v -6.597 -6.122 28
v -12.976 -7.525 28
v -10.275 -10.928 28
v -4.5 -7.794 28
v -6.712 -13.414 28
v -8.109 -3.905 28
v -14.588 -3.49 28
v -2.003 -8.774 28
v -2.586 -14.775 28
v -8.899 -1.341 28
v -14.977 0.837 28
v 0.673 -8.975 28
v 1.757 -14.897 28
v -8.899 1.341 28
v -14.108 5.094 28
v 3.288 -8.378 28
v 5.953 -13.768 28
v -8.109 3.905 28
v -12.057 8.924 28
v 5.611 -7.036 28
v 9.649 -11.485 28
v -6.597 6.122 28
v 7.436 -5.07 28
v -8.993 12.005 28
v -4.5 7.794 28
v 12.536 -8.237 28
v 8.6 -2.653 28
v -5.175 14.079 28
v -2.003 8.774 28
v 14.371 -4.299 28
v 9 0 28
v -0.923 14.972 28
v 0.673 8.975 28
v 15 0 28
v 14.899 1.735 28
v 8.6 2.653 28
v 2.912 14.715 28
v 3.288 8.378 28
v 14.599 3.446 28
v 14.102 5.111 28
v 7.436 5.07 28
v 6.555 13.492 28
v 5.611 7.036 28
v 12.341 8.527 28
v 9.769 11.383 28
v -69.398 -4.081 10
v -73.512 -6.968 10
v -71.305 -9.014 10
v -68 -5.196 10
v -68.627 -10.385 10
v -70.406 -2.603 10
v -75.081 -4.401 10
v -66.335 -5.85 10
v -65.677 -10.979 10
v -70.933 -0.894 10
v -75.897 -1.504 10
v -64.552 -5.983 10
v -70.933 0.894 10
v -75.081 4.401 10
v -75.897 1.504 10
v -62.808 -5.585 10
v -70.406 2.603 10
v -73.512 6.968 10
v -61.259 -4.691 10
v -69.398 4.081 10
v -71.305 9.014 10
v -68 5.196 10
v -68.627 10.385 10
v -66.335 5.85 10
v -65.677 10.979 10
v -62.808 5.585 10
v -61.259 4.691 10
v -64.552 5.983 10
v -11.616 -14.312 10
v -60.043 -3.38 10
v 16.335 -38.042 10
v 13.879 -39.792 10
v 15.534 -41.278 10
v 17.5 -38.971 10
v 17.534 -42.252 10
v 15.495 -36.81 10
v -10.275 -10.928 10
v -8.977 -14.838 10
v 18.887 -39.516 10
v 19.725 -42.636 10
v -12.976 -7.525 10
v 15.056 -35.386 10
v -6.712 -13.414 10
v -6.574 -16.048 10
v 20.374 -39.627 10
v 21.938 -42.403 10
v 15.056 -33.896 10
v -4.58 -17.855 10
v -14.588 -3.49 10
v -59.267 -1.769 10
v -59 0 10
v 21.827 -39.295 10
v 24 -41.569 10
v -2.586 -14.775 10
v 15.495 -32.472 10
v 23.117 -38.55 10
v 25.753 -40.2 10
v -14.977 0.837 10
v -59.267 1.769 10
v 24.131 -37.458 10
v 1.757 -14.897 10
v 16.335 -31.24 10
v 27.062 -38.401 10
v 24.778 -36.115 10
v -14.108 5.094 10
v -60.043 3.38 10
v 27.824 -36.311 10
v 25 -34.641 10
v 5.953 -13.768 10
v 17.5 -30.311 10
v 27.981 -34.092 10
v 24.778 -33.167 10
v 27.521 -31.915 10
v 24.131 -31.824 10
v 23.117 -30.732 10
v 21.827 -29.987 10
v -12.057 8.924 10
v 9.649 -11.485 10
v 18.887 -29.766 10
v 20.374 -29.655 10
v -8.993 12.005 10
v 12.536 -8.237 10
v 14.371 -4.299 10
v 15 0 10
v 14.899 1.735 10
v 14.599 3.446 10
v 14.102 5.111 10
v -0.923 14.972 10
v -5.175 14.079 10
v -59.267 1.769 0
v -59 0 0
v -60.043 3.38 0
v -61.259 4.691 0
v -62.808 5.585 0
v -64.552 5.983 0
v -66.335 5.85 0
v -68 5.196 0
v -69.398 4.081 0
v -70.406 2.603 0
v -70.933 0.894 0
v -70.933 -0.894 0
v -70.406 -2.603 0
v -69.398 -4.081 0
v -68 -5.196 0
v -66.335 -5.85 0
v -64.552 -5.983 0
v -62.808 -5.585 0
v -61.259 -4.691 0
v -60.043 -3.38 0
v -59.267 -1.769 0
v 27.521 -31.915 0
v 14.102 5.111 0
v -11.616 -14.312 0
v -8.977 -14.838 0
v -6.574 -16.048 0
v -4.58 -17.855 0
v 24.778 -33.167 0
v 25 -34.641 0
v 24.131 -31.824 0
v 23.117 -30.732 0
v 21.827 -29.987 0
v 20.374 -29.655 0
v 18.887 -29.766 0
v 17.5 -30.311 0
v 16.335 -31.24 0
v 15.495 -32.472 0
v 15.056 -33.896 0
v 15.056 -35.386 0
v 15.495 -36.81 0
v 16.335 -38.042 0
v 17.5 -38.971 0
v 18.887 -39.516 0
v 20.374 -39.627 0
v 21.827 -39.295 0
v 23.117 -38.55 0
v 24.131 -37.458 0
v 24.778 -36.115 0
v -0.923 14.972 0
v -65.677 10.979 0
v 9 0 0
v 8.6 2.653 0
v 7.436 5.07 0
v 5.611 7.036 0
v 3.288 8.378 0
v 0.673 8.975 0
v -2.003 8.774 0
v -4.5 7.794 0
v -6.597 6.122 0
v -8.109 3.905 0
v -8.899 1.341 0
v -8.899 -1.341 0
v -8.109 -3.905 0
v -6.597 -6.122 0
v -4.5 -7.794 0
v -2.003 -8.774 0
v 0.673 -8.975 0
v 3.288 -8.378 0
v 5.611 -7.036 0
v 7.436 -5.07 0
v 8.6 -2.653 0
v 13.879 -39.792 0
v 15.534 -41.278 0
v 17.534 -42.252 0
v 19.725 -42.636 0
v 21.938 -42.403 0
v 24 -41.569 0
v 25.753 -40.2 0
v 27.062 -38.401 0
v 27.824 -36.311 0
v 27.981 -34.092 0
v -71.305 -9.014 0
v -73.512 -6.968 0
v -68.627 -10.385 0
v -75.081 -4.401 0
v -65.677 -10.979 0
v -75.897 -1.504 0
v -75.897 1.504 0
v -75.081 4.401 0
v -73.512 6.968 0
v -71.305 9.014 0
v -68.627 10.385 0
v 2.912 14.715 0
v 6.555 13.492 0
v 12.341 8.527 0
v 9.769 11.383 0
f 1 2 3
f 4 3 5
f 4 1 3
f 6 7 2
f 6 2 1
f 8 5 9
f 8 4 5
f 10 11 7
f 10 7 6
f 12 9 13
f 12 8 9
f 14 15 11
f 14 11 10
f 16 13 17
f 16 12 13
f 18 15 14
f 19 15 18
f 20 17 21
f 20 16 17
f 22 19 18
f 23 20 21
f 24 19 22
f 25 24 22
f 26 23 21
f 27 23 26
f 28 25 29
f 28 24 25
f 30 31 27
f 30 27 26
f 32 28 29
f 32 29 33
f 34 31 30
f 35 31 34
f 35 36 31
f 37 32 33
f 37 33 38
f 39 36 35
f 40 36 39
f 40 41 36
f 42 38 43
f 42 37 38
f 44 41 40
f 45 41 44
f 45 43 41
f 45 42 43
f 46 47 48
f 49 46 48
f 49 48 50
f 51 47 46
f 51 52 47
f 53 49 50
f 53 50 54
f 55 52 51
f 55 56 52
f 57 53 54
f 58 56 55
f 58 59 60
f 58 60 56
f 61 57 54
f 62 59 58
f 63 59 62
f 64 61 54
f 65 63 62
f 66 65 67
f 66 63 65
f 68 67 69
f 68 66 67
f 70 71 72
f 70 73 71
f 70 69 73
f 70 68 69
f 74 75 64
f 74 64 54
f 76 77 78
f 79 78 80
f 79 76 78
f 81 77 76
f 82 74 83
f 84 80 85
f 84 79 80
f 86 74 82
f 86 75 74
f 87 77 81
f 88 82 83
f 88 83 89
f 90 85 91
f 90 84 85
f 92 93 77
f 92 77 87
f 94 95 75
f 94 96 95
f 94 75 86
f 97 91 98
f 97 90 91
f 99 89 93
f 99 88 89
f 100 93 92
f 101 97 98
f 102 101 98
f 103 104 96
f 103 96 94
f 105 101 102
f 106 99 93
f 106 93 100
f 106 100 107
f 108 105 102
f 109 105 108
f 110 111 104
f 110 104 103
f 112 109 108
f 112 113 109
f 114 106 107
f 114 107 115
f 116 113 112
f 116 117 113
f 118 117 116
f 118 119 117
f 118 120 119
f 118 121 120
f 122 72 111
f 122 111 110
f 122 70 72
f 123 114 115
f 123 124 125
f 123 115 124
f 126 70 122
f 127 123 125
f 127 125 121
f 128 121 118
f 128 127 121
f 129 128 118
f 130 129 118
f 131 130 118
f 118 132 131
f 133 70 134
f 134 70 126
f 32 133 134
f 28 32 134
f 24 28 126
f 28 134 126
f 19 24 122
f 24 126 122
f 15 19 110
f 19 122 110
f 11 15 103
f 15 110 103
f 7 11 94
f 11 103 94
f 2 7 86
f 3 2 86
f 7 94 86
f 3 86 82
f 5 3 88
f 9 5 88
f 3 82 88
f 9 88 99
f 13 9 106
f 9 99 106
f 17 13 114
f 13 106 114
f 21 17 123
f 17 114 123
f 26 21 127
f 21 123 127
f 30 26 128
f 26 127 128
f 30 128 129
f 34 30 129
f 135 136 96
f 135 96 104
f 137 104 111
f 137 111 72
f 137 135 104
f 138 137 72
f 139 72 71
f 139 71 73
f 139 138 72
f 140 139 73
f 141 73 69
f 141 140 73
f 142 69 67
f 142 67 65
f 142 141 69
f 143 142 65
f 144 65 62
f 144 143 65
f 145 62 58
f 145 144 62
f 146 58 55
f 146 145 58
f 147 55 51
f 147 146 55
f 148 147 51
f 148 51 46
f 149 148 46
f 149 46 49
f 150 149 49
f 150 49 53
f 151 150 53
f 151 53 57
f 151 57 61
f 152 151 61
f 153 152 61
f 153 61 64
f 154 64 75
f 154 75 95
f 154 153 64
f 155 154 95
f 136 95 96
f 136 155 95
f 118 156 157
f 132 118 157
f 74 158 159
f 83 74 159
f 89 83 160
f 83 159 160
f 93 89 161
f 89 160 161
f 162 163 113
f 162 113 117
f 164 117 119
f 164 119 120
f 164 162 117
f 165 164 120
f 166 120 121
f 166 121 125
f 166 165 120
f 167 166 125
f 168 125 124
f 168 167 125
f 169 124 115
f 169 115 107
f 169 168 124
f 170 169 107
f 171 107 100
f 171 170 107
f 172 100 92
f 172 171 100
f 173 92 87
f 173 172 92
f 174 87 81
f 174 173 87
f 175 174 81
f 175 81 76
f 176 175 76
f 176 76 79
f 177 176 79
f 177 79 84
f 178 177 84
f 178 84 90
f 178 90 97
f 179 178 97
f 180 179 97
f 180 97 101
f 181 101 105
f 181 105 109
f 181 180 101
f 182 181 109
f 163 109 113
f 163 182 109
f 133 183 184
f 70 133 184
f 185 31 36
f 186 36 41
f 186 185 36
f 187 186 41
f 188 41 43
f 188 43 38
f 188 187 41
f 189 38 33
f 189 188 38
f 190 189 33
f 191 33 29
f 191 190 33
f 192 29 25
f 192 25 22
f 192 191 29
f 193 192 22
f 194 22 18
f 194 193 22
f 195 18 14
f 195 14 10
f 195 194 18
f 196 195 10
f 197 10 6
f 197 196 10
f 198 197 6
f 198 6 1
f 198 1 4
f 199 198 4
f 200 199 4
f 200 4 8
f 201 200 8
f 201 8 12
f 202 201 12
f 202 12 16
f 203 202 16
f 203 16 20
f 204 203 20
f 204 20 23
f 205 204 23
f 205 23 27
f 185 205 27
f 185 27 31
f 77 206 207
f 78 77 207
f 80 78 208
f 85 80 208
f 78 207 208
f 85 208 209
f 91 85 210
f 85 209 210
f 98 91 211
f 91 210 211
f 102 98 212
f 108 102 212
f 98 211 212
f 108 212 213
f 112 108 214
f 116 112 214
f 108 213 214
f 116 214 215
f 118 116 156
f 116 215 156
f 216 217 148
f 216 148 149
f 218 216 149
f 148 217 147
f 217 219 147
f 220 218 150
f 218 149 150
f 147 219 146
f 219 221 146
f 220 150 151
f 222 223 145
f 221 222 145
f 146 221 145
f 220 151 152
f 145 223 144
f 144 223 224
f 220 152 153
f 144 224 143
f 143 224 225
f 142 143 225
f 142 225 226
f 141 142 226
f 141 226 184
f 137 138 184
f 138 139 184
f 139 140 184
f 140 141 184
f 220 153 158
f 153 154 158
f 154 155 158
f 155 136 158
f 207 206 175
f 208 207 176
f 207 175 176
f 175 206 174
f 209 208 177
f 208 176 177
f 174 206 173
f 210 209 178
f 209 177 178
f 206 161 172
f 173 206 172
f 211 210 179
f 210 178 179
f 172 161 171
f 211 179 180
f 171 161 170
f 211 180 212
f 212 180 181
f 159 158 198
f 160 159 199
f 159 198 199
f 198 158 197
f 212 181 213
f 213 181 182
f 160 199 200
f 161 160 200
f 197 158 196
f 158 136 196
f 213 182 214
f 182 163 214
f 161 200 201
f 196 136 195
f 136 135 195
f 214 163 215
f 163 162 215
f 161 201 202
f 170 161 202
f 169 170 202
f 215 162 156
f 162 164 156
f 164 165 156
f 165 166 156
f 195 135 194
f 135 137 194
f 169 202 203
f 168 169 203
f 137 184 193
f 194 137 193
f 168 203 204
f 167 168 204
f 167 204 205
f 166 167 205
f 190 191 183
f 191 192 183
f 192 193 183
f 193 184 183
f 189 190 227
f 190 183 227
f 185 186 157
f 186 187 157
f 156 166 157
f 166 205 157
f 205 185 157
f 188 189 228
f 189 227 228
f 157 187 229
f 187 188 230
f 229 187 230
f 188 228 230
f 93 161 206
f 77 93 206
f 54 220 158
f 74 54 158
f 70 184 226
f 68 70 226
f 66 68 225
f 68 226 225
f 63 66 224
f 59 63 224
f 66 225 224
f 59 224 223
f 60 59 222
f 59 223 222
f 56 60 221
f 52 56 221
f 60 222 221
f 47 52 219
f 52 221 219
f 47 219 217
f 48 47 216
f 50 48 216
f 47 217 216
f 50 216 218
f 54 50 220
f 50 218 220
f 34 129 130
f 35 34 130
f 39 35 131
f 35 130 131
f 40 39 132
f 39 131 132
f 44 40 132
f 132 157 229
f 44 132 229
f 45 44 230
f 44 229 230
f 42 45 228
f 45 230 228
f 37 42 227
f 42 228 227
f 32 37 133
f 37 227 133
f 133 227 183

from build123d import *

# Parameters (mm, degrees)
F0_R     = 9
F1_DEPTH = 28
F0_R_2   = 5
F0_R_3   = 6
F2_DEPTH = 10


with BuildPart() as f1:
    # F0 (on Top) → F1 (new body)
    with BuildSketch(Plane.XY):
        with BuildLine():
            ThreePointArc((-0.923077, 14.971571), (-10.275063, -10.928087), (15, 0))
            ThreePointArc((15, 0), (14.773901, 2.594582), (14.102419, 5.110947))
            ThreePointArc((14.102419, 5.110947), (8.22993, 12.540664), (-0.923077, 14.971571))
        make_face()
        Circle(F0_R, mode=Mode.SUBTRACT)
    extrude(amount=F1_DEPTH)

    # F0 (on Top) → F2 (join)
    with BuildSketch(Plane.XY):
        with BuildLine():
            ThreePointArc((-0.923077, 14.971571), (-10.275063, -10.928087), (15, 0))
            ThreePointArc((15, 0), (14.773901, 2.594582), (14.102419, 5.110947))
            ThreePointArc((14.102419, 5.110947), (8.22993, 12.540664), (-0.923077, 14.971571))
        make_face()
        Circle(F0_R, mode=Mode.SUBTRACT)
        with BuildLine():
            ThreePointArc((14.102419, 5.110947), (14.773901, 2.594582), (15, 0))
            ThreePointArc((15, 0), (-10.275063, -10.928087), (-0.923077, 14.971571))
            Line((-0.923077, 14.971571), (-65.676923, 10.979152))
            ThreePointArc((-65.676923, 10.979152), (-76, 0), (-65.676923, -10.979152))
            Line((-65.676923, -10.979152), (-11.616035, -14.312293))
            ThreePointArc((-11.616035, -14.312293), (-7.734373, -15.361567), (-4.579807, -17.854954))
            Line((-4.579807, -17.854954), (13.87871, -39.791725))
            ThreePointArc((13.87871, -39.791725), (24, -41.569219), (27.52129, -31.915178))
            Line((27.52129, -31.915178), (14.102419, 5.110947))
        make_face()
        with Locations((20, -34.641016)):
            Circle(F0_R_2, mode=Mode.SUBTRACT)
        with Locations((-65, 0)):
            Circle(F0_R_3, mode=Mode.SUBTRACT)
    extrude(amount=F2_DEPTH)


solid = f1.part
